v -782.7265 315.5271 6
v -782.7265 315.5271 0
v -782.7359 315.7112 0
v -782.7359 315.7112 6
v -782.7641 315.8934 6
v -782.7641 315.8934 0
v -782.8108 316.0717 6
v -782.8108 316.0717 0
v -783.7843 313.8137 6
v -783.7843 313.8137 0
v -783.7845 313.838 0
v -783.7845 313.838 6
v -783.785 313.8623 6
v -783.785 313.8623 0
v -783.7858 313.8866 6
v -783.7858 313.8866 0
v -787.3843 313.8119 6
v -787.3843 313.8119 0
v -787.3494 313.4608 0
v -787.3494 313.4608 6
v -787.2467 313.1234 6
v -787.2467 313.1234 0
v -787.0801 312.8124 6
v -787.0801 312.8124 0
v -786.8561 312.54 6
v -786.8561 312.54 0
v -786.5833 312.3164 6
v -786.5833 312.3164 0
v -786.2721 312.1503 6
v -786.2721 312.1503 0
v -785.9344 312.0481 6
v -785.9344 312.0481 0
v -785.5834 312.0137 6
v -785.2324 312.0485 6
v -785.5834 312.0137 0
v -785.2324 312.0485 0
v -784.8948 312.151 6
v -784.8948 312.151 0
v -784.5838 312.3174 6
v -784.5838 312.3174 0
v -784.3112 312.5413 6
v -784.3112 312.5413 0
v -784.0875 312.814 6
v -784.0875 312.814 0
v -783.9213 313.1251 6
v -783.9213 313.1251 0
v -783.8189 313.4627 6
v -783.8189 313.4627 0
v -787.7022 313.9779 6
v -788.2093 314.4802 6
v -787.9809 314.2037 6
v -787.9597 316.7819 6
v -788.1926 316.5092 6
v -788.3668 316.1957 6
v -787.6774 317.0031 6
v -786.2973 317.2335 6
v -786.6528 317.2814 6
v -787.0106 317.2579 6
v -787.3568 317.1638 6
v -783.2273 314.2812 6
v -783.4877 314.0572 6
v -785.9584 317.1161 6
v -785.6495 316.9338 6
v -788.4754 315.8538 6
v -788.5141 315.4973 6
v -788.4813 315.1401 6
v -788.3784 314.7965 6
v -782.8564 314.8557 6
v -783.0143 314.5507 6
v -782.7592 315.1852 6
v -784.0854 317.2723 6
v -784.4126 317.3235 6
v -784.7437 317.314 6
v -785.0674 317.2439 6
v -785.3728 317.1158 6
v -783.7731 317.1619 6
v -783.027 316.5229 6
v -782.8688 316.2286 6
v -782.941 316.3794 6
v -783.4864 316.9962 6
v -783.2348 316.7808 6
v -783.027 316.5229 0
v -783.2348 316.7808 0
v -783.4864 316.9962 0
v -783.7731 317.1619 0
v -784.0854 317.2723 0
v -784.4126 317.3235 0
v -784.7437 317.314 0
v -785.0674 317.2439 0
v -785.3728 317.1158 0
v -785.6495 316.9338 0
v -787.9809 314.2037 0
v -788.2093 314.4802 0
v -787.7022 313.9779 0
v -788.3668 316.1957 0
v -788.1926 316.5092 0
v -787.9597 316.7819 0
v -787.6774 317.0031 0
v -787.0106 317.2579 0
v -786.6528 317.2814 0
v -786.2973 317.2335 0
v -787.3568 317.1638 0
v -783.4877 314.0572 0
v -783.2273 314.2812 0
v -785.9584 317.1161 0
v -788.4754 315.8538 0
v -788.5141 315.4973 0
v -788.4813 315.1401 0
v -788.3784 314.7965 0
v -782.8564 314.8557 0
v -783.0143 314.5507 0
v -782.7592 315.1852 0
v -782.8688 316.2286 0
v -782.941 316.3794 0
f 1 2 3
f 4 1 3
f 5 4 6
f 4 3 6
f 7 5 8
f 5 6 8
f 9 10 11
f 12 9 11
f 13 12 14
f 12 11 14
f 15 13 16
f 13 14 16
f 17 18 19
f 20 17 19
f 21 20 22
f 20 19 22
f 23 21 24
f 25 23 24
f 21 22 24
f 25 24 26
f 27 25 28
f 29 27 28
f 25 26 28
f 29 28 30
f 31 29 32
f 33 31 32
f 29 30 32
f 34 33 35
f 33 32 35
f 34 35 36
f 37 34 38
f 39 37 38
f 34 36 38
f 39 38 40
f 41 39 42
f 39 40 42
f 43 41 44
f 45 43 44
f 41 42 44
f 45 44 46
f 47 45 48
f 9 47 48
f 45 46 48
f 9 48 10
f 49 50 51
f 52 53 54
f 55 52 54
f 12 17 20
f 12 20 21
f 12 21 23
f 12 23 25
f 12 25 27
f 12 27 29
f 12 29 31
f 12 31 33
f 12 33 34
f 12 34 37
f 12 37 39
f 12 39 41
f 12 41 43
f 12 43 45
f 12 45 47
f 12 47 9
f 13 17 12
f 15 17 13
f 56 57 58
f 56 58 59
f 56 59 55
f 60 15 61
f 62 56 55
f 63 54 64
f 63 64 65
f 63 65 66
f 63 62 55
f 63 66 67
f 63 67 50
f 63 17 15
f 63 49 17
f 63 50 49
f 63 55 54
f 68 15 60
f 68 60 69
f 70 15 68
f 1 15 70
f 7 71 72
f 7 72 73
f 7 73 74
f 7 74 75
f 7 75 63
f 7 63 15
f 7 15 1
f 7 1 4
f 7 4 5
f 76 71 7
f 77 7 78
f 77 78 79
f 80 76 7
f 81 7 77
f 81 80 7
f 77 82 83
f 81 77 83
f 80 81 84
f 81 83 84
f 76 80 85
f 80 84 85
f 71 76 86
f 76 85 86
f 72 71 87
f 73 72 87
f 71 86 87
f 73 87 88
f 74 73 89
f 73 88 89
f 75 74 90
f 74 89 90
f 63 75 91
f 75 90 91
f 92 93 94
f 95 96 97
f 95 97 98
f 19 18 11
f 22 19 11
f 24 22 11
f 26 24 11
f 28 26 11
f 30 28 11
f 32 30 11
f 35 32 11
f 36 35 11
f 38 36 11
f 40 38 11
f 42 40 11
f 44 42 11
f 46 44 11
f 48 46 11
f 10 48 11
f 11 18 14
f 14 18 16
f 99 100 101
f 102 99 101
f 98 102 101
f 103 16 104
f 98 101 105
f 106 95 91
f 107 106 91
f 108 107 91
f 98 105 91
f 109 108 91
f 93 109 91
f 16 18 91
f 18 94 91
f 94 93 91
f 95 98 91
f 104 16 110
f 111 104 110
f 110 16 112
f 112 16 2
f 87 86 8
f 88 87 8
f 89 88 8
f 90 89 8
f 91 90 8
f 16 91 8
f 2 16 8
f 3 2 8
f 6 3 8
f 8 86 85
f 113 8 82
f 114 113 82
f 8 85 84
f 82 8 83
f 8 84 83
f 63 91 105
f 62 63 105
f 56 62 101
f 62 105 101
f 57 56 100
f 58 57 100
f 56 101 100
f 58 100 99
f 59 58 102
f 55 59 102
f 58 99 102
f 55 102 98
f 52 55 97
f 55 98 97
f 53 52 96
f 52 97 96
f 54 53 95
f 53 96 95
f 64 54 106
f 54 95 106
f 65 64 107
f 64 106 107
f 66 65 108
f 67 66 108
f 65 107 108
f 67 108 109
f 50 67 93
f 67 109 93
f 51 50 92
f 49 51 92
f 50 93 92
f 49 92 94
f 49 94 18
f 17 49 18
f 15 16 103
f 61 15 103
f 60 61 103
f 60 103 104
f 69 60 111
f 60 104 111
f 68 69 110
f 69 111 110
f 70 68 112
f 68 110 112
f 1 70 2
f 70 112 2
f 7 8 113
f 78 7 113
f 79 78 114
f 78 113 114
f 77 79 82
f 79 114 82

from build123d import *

# Parameters (mm, degrees)
F1_DEPTH = 6


with BuildPart() as f1:
    # F0 (on Top) → F1 (new body)
    with BuildSketch(Plane.XY):
        with BuildLine():
            ThreePointArc((-782.8108229719, 316.071718416), (-782.9031509549, 316.304858246), (-783.026982617, 316.5229049295))
            ThreePointArc((-783.026982617, 316.5229049295), (-782.9094811402, 316.3018255077), (-782.8108229719, 316.071718416))
        make_face()
        with BuildLine():
            ThreePointArc((-783.7858049809, 313.886586525), (-784.7140567778, 313.7369427263), (-785.5911241746, 314.075760445))
            ThreePointArc((-785.5911241746, 314.075760445), (-786.452085755, 313.7016307347), (-787.3843295654, 313.8118548753))
            ThreePointArc((-787.3843295654, 313.8118548753), (-785.5833850086, 312.0137462238), (-783.7843305588, 313.8137459755))
            ThreePointArc((-783.7843305588, 313.8137459755), (-783.7846992021, 313.8501737107), (-783.7858049809, 313.886586525))
        make_face()
        with BuildLine():
            ThreePointArc((-787.3843295654, 313.8118548753), (-786.452085755, 313.7016307347), (-785.5911241746, 314.075760445))
            ThreePointArc((-785.5911241746, 314.075760445), (-786.1153495113, 314.6812963137), (-786.3249929012, 315.4543005447))
            ThreePointArc((-786.3249929012, 315.4543005447), (-787.0969927705, 314.7893755329), (-787.3843295654, 313.8118548753))
        make_face()
        with BuildLine():
            ThreePointArc((-786.3249929012, 315.4543005447), (-786.163887167, 316.2747079845), (-785.6495114244, 316.9338293848))
            ThreePointArc((-785.6495114244, 316.9338293848), (-788.2875683827, 316.3567553772), (-787.3843295654, 313.8118548753))
            ThreePointArc((-787.3843295654, 313.8118548753), (-787.0969927705, 314.7893755329), (-786.3249929012, 315.4543005447))
        make_face()
        with BuildLine():
            ThreePointArc((-785.6495114244, 316.9338293848), (-785.1089211657, 316.2968084324), (-784.9141692691, 315.4843398357))
            ThreePointArc((-784.9141692691, 315.4843398357), (-784.1140218759, 314.8521064028), (-783.7858049809, 313.886586525))
            ThreePointArc((-783.7858049809, 313.886586525), (-783.014317824, 314.5507170614), (-782.7264673233, 315.5271410942))
            ThreePointArc((-782.7264673233, 315.5271410942), (-782.7476812439, 315.8026770877), (-782.8108229719, 316.071718416))
            ThreePointArc((-782.8108229719, 316.071718416), (-782.9094811402, 316.3018255077), (-783.026982617, 316.5229049295))
            ThreePointArc((-783.026982617, 316.5229049295), (-784.2478248834, 317.3054432032), (-785.6495114244, 316.9338293848))
        make_face()
        with BuildLine():
            ThreePointArc((-784.9141692691, 315.4843398357), (-784.9141685241, 315.4833942858), (-784.9141682757, 315.4824487356))
            ThreePointArc((-784.9141682757, 315.4824487356), (-785.0922127612, 314.7018974503), (-785.5911241746, 314.075760445))
            ThreePointArc((-785.5911241746, 314.075760445), (-784.7140567778, 313.7369427263), (-783.7858049809, 313.886586525))
            ThreePointArc((-783.7858049809, 313.886586525), (-784.1140218759, 314.8521064028), (-784.9141692691, 315.4843398357))
        make_face()
        with BuildLine():
            ThreePointArc((-785.5911241746, 314.075760445), (-785.0922127612, 314.7018974503), (-784.9141682757, 315.4824487356))
            ThreePointArc((-784.9141682757, 315.4824487356), (-784.9141685241, 315.4833942858), (-784.9141692691, 315.4843398357))
            ThreePointArc((-784.9141692691, 315.4843398357), (-785.622647518, 315.6133380989), (-786.3249929012, 315.4543005447))
            ThreePointArc((-786.3249929012, 315.4543005447), (-786.1153495113, 314.6812963137), (-785.5911241746, 314.075760445))
        make_face()
        with BuildLine():
            ThreePointArc((-786.3249929012, 315.4543005447), (-785.622647518, 315.6133380989), (-784.9141692691, 315.4843398357))
            ThreePointArc((-784.9141692691, 315.4843398357), (-785.1089211657, 316.2968084324), (-785.6495114244, 316.9338293848))
            ThreePointArc((-785.6495114244, 316.9338293848), (-786.163887167, 316.2747079845), (-786.3249929012, 315.4543005447))
        make_face()
    extrude(amount=F1_DEPTH)


solid = f1.part
